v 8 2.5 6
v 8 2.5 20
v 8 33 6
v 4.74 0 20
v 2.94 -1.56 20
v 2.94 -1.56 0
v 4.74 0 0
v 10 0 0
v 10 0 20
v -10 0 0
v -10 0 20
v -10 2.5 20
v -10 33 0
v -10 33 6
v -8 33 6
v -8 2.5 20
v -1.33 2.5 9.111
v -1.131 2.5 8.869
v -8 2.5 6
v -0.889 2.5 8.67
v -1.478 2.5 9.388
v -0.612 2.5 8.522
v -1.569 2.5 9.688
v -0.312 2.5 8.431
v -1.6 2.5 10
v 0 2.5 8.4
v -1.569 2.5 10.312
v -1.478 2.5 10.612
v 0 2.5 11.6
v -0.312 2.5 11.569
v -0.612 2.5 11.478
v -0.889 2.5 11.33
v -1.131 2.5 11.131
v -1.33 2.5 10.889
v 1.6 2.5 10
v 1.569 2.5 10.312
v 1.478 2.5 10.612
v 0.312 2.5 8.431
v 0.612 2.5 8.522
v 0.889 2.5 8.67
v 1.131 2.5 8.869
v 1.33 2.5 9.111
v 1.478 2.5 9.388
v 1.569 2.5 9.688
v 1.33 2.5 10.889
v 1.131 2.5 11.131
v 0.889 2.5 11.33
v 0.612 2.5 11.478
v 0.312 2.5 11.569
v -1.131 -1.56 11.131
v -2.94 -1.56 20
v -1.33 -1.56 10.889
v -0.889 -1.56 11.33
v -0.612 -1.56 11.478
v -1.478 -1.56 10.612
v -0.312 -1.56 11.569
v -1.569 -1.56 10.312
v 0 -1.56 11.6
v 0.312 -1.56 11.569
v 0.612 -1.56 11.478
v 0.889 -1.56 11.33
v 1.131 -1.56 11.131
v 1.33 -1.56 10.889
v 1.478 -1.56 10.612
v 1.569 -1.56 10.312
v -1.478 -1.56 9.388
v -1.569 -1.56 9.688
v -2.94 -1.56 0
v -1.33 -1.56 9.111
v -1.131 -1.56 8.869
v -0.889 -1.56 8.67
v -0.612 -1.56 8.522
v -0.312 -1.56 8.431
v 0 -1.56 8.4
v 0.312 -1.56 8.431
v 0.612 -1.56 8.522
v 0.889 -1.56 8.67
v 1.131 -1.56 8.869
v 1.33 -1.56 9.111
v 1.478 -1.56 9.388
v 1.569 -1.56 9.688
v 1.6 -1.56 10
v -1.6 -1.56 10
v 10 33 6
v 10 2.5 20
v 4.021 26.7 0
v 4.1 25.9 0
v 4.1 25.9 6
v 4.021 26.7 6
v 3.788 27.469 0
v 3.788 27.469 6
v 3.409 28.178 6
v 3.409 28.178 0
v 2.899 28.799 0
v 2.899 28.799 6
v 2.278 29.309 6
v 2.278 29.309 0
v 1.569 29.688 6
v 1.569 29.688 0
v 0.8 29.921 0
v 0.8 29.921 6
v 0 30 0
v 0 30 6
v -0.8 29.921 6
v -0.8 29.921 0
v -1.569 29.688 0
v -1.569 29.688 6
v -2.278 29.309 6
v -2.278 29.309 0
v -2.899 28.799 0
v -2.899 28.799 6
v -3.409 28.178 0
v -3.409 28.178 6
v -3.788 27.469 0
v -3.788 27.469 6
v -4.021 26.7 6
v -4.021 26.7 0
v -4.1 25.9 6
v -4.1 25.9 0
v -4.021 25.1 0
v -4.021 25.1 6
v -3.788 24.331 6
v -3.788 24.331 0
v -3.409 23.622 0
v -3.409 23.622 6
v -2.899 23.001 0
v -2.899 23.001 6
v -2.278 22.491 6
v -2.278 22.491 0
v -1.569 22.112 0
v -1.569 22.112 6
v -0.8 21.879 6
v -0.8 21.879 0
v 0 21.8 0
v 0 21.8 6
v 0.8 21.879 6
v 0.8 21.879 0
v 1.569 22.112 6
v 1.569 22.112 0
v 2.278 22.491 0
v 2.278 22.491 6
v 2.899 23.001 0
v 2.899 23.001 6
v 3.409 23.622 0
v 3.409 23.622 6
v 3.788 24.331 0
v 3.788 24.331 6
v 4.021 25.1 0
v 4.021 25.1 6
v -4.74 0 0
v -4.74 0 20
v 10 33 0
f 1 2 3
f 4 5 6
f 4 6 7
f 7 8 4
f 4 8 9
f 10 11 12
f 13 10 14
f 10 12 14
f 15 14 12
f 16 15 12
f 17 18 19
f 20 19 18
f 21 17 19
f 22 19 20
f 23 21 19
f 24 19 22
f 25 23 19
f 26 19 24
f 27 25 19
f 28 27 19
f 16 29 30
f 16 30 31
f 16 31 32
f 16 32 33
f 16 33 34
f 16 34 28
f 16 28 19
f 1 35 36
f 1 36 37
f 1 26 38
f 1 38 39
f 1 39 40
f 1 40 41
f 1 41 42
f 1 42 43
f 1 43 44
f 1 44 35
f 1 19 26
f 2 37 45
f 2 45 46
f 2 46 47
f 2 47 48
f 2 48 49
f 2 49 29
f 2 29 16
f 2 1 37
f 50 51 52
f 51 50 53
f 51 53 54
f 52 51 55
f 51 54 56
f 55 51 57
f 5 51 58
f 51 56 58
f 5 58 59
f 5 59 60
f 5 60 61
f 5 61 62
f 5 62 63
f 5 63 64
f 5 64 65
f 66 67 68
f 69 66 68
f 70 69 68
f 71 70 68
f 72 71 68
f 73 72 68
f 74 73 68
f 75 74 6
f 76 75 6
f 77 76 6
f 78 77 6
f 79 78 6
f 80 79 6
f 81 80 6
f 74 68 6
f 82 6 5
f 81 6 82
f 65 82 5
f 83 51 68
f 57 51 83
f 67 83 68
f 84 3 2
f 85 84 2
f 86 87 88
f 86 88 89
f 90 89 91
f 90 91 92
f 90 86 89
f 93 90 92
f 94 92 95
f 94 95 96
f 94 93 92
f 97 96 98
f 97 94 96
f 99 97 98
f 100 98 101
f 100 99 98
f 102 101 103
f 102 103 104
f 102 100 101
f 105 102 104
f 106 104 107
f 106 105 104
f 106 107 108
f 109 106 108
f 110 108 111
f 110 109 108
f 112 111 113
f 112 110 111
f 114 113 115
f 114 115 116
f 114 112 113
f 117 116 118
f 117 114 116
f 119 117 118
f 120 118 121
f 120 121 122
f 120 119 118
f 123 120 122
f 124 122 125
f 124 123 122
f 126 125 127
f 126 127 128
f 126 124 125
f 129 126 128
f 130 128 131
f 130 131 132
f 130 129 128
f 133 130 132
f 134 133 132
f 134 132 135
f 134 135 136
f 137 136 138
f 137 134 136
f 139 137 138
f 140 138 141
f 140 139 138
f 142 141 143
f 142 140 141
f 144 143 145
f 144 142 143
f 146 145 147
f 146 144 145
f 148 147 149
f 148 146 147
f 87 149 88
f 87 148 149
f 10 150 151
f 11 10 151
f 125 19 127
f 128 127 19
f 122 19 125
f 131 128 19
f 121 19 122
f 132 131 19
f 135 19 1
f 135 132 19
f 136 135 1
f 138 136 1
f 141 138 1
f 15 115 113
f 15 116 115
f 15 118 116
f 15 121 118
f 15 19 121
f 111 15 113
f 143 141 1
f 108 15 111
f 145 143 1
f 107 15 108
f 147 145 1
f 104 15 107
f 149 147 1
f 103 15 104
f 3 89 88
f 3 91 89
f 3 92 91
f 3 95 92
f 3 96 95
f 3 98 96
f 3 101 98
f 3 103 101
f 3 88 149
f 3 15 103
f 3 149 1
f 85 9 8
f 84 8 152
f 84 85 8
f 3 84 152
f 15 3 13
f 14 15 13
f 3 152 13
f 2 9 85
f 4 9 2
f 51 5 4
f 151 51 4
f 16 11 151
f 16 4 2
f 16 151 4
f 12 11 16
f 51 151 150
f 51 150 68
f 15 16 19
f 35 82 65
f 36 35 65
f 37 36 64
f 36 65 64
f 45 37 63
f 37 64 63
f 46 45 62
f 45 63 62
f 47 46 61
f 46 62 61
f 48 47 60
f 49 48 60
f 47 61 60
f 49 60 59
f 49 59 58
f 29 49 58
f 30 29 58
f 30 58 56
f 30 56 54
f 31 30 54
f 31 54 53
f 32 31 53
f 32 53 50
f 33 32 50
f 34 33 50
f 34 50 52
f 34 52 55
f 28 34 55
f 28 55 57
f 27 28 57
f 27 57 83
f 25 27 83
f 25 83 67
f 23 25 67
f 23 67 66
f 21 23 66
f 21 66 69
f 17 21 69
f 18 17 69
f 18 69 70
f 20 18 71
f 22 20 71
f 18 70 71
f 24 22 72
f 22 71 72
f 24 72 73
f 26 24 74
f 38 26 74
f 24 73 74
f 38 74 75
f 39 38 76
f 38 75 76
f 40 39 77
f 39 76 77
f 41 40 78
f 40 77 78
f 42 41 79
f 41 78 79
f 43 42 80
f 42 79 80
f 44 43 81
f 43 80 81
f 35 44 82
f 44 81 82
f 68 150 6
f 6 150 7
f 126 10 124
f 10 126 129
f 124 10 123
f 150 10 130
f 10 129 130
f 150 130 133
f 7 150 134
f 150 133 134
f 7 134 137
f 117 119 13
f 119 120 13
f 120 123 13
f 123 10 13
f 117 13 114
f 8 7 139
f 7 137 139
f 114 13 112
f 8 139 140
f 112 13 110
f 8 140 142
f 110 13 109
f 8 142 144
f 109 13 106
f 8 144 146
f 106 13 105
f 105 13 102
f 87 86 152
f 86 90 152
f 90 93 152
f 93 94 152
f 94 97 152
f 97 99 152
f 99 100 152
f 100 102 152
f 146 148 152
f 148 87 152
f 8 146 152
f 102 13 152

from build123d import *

# Parameters (mm, degrees)
SKETCH_R            = 4.1
PAD_DEPTH           = 6
SKETCH001_W         = 2.5
SKETCH001_H         = 14
PAD001_DEPTH        = 20
PAD002_DEPTH        = 14
PAD003_DEPTH        = 2
LINEARPATTERN_COUNT = 2
LINEARPATTERN_PITCH = 18
SKETCH003_R         = 1.6
POCKET_DEPTH        = 34.561


with BuildPart() as part:
    # Sketch → Pad (new body)
    with BuildSketch(Plane.XY):
        Polygon((-4.74, 0), (-2.94, -1.56), (2.94, -1.56), (4.74, 0), (10, 0), (10, 33), (-10, 33), (-10, 0), align=None)
        with Locations((0, 25.9)):
            Circle(SKETCH_R, mode=Mode.SUBTRACT)
    extrude(amount=PAD_DEPTH)

    # Sketch001 (on Face5 of Pad) → Pad001 (join)
    with BuildSketch(Plane.YZ.offset(10)):
        with Locations((1.25, 13)):
            Rectangle(SKETCH001_W, SKETCH001_H)
    extrude(amount=-PAD001_DEPTH)

    # Pad001 Face5 → Pad002 (add)
    with BuildSketch(Plane(origin=(0, -0.719062, 6), x_dir=(0, 1, 0), z_dir=(0, 0, 1))):
        Polygon((0.719062, -4.74), (0.719062, 4.74), (-0.840938, 2.94), (-0.840938, -2.94), align=None)
    extrude(amount=PAD002_DEPTH)

    # Sketch002 (on Face6 of Pad002) → Pad003 (join)
    with BuildSketch(Plane(origin=(-10, 0, 0), x_dir=(0, -1, 0), z_dir=(-1, 0, 0))):
        Polygon((-33, 6), (-2.5, 20), (-2.5, 6), align=None)
    pad003 = extrude(amount=-PAD003_DEPTH)

    # LinearPattern: Pad003 ×2
    with Locations(*[(i * LINEARPATTERN_PITCH, 0, 0) for i in range(1, LINEARPATTERN_COUNT)]):
        add(pad003)

    # Sketch003 (on Face9 of LinearPattern) → Pocket (cut, through all)
    with BuildSketch(Plane.XZ.offset(1.56)):
        with Locations((0, 10)):
            Circle(SKETCH003_R)
    extrude(amount=-POCKET_DEPTH, mode=Mode.SUBTRACT)


solid = part.part
